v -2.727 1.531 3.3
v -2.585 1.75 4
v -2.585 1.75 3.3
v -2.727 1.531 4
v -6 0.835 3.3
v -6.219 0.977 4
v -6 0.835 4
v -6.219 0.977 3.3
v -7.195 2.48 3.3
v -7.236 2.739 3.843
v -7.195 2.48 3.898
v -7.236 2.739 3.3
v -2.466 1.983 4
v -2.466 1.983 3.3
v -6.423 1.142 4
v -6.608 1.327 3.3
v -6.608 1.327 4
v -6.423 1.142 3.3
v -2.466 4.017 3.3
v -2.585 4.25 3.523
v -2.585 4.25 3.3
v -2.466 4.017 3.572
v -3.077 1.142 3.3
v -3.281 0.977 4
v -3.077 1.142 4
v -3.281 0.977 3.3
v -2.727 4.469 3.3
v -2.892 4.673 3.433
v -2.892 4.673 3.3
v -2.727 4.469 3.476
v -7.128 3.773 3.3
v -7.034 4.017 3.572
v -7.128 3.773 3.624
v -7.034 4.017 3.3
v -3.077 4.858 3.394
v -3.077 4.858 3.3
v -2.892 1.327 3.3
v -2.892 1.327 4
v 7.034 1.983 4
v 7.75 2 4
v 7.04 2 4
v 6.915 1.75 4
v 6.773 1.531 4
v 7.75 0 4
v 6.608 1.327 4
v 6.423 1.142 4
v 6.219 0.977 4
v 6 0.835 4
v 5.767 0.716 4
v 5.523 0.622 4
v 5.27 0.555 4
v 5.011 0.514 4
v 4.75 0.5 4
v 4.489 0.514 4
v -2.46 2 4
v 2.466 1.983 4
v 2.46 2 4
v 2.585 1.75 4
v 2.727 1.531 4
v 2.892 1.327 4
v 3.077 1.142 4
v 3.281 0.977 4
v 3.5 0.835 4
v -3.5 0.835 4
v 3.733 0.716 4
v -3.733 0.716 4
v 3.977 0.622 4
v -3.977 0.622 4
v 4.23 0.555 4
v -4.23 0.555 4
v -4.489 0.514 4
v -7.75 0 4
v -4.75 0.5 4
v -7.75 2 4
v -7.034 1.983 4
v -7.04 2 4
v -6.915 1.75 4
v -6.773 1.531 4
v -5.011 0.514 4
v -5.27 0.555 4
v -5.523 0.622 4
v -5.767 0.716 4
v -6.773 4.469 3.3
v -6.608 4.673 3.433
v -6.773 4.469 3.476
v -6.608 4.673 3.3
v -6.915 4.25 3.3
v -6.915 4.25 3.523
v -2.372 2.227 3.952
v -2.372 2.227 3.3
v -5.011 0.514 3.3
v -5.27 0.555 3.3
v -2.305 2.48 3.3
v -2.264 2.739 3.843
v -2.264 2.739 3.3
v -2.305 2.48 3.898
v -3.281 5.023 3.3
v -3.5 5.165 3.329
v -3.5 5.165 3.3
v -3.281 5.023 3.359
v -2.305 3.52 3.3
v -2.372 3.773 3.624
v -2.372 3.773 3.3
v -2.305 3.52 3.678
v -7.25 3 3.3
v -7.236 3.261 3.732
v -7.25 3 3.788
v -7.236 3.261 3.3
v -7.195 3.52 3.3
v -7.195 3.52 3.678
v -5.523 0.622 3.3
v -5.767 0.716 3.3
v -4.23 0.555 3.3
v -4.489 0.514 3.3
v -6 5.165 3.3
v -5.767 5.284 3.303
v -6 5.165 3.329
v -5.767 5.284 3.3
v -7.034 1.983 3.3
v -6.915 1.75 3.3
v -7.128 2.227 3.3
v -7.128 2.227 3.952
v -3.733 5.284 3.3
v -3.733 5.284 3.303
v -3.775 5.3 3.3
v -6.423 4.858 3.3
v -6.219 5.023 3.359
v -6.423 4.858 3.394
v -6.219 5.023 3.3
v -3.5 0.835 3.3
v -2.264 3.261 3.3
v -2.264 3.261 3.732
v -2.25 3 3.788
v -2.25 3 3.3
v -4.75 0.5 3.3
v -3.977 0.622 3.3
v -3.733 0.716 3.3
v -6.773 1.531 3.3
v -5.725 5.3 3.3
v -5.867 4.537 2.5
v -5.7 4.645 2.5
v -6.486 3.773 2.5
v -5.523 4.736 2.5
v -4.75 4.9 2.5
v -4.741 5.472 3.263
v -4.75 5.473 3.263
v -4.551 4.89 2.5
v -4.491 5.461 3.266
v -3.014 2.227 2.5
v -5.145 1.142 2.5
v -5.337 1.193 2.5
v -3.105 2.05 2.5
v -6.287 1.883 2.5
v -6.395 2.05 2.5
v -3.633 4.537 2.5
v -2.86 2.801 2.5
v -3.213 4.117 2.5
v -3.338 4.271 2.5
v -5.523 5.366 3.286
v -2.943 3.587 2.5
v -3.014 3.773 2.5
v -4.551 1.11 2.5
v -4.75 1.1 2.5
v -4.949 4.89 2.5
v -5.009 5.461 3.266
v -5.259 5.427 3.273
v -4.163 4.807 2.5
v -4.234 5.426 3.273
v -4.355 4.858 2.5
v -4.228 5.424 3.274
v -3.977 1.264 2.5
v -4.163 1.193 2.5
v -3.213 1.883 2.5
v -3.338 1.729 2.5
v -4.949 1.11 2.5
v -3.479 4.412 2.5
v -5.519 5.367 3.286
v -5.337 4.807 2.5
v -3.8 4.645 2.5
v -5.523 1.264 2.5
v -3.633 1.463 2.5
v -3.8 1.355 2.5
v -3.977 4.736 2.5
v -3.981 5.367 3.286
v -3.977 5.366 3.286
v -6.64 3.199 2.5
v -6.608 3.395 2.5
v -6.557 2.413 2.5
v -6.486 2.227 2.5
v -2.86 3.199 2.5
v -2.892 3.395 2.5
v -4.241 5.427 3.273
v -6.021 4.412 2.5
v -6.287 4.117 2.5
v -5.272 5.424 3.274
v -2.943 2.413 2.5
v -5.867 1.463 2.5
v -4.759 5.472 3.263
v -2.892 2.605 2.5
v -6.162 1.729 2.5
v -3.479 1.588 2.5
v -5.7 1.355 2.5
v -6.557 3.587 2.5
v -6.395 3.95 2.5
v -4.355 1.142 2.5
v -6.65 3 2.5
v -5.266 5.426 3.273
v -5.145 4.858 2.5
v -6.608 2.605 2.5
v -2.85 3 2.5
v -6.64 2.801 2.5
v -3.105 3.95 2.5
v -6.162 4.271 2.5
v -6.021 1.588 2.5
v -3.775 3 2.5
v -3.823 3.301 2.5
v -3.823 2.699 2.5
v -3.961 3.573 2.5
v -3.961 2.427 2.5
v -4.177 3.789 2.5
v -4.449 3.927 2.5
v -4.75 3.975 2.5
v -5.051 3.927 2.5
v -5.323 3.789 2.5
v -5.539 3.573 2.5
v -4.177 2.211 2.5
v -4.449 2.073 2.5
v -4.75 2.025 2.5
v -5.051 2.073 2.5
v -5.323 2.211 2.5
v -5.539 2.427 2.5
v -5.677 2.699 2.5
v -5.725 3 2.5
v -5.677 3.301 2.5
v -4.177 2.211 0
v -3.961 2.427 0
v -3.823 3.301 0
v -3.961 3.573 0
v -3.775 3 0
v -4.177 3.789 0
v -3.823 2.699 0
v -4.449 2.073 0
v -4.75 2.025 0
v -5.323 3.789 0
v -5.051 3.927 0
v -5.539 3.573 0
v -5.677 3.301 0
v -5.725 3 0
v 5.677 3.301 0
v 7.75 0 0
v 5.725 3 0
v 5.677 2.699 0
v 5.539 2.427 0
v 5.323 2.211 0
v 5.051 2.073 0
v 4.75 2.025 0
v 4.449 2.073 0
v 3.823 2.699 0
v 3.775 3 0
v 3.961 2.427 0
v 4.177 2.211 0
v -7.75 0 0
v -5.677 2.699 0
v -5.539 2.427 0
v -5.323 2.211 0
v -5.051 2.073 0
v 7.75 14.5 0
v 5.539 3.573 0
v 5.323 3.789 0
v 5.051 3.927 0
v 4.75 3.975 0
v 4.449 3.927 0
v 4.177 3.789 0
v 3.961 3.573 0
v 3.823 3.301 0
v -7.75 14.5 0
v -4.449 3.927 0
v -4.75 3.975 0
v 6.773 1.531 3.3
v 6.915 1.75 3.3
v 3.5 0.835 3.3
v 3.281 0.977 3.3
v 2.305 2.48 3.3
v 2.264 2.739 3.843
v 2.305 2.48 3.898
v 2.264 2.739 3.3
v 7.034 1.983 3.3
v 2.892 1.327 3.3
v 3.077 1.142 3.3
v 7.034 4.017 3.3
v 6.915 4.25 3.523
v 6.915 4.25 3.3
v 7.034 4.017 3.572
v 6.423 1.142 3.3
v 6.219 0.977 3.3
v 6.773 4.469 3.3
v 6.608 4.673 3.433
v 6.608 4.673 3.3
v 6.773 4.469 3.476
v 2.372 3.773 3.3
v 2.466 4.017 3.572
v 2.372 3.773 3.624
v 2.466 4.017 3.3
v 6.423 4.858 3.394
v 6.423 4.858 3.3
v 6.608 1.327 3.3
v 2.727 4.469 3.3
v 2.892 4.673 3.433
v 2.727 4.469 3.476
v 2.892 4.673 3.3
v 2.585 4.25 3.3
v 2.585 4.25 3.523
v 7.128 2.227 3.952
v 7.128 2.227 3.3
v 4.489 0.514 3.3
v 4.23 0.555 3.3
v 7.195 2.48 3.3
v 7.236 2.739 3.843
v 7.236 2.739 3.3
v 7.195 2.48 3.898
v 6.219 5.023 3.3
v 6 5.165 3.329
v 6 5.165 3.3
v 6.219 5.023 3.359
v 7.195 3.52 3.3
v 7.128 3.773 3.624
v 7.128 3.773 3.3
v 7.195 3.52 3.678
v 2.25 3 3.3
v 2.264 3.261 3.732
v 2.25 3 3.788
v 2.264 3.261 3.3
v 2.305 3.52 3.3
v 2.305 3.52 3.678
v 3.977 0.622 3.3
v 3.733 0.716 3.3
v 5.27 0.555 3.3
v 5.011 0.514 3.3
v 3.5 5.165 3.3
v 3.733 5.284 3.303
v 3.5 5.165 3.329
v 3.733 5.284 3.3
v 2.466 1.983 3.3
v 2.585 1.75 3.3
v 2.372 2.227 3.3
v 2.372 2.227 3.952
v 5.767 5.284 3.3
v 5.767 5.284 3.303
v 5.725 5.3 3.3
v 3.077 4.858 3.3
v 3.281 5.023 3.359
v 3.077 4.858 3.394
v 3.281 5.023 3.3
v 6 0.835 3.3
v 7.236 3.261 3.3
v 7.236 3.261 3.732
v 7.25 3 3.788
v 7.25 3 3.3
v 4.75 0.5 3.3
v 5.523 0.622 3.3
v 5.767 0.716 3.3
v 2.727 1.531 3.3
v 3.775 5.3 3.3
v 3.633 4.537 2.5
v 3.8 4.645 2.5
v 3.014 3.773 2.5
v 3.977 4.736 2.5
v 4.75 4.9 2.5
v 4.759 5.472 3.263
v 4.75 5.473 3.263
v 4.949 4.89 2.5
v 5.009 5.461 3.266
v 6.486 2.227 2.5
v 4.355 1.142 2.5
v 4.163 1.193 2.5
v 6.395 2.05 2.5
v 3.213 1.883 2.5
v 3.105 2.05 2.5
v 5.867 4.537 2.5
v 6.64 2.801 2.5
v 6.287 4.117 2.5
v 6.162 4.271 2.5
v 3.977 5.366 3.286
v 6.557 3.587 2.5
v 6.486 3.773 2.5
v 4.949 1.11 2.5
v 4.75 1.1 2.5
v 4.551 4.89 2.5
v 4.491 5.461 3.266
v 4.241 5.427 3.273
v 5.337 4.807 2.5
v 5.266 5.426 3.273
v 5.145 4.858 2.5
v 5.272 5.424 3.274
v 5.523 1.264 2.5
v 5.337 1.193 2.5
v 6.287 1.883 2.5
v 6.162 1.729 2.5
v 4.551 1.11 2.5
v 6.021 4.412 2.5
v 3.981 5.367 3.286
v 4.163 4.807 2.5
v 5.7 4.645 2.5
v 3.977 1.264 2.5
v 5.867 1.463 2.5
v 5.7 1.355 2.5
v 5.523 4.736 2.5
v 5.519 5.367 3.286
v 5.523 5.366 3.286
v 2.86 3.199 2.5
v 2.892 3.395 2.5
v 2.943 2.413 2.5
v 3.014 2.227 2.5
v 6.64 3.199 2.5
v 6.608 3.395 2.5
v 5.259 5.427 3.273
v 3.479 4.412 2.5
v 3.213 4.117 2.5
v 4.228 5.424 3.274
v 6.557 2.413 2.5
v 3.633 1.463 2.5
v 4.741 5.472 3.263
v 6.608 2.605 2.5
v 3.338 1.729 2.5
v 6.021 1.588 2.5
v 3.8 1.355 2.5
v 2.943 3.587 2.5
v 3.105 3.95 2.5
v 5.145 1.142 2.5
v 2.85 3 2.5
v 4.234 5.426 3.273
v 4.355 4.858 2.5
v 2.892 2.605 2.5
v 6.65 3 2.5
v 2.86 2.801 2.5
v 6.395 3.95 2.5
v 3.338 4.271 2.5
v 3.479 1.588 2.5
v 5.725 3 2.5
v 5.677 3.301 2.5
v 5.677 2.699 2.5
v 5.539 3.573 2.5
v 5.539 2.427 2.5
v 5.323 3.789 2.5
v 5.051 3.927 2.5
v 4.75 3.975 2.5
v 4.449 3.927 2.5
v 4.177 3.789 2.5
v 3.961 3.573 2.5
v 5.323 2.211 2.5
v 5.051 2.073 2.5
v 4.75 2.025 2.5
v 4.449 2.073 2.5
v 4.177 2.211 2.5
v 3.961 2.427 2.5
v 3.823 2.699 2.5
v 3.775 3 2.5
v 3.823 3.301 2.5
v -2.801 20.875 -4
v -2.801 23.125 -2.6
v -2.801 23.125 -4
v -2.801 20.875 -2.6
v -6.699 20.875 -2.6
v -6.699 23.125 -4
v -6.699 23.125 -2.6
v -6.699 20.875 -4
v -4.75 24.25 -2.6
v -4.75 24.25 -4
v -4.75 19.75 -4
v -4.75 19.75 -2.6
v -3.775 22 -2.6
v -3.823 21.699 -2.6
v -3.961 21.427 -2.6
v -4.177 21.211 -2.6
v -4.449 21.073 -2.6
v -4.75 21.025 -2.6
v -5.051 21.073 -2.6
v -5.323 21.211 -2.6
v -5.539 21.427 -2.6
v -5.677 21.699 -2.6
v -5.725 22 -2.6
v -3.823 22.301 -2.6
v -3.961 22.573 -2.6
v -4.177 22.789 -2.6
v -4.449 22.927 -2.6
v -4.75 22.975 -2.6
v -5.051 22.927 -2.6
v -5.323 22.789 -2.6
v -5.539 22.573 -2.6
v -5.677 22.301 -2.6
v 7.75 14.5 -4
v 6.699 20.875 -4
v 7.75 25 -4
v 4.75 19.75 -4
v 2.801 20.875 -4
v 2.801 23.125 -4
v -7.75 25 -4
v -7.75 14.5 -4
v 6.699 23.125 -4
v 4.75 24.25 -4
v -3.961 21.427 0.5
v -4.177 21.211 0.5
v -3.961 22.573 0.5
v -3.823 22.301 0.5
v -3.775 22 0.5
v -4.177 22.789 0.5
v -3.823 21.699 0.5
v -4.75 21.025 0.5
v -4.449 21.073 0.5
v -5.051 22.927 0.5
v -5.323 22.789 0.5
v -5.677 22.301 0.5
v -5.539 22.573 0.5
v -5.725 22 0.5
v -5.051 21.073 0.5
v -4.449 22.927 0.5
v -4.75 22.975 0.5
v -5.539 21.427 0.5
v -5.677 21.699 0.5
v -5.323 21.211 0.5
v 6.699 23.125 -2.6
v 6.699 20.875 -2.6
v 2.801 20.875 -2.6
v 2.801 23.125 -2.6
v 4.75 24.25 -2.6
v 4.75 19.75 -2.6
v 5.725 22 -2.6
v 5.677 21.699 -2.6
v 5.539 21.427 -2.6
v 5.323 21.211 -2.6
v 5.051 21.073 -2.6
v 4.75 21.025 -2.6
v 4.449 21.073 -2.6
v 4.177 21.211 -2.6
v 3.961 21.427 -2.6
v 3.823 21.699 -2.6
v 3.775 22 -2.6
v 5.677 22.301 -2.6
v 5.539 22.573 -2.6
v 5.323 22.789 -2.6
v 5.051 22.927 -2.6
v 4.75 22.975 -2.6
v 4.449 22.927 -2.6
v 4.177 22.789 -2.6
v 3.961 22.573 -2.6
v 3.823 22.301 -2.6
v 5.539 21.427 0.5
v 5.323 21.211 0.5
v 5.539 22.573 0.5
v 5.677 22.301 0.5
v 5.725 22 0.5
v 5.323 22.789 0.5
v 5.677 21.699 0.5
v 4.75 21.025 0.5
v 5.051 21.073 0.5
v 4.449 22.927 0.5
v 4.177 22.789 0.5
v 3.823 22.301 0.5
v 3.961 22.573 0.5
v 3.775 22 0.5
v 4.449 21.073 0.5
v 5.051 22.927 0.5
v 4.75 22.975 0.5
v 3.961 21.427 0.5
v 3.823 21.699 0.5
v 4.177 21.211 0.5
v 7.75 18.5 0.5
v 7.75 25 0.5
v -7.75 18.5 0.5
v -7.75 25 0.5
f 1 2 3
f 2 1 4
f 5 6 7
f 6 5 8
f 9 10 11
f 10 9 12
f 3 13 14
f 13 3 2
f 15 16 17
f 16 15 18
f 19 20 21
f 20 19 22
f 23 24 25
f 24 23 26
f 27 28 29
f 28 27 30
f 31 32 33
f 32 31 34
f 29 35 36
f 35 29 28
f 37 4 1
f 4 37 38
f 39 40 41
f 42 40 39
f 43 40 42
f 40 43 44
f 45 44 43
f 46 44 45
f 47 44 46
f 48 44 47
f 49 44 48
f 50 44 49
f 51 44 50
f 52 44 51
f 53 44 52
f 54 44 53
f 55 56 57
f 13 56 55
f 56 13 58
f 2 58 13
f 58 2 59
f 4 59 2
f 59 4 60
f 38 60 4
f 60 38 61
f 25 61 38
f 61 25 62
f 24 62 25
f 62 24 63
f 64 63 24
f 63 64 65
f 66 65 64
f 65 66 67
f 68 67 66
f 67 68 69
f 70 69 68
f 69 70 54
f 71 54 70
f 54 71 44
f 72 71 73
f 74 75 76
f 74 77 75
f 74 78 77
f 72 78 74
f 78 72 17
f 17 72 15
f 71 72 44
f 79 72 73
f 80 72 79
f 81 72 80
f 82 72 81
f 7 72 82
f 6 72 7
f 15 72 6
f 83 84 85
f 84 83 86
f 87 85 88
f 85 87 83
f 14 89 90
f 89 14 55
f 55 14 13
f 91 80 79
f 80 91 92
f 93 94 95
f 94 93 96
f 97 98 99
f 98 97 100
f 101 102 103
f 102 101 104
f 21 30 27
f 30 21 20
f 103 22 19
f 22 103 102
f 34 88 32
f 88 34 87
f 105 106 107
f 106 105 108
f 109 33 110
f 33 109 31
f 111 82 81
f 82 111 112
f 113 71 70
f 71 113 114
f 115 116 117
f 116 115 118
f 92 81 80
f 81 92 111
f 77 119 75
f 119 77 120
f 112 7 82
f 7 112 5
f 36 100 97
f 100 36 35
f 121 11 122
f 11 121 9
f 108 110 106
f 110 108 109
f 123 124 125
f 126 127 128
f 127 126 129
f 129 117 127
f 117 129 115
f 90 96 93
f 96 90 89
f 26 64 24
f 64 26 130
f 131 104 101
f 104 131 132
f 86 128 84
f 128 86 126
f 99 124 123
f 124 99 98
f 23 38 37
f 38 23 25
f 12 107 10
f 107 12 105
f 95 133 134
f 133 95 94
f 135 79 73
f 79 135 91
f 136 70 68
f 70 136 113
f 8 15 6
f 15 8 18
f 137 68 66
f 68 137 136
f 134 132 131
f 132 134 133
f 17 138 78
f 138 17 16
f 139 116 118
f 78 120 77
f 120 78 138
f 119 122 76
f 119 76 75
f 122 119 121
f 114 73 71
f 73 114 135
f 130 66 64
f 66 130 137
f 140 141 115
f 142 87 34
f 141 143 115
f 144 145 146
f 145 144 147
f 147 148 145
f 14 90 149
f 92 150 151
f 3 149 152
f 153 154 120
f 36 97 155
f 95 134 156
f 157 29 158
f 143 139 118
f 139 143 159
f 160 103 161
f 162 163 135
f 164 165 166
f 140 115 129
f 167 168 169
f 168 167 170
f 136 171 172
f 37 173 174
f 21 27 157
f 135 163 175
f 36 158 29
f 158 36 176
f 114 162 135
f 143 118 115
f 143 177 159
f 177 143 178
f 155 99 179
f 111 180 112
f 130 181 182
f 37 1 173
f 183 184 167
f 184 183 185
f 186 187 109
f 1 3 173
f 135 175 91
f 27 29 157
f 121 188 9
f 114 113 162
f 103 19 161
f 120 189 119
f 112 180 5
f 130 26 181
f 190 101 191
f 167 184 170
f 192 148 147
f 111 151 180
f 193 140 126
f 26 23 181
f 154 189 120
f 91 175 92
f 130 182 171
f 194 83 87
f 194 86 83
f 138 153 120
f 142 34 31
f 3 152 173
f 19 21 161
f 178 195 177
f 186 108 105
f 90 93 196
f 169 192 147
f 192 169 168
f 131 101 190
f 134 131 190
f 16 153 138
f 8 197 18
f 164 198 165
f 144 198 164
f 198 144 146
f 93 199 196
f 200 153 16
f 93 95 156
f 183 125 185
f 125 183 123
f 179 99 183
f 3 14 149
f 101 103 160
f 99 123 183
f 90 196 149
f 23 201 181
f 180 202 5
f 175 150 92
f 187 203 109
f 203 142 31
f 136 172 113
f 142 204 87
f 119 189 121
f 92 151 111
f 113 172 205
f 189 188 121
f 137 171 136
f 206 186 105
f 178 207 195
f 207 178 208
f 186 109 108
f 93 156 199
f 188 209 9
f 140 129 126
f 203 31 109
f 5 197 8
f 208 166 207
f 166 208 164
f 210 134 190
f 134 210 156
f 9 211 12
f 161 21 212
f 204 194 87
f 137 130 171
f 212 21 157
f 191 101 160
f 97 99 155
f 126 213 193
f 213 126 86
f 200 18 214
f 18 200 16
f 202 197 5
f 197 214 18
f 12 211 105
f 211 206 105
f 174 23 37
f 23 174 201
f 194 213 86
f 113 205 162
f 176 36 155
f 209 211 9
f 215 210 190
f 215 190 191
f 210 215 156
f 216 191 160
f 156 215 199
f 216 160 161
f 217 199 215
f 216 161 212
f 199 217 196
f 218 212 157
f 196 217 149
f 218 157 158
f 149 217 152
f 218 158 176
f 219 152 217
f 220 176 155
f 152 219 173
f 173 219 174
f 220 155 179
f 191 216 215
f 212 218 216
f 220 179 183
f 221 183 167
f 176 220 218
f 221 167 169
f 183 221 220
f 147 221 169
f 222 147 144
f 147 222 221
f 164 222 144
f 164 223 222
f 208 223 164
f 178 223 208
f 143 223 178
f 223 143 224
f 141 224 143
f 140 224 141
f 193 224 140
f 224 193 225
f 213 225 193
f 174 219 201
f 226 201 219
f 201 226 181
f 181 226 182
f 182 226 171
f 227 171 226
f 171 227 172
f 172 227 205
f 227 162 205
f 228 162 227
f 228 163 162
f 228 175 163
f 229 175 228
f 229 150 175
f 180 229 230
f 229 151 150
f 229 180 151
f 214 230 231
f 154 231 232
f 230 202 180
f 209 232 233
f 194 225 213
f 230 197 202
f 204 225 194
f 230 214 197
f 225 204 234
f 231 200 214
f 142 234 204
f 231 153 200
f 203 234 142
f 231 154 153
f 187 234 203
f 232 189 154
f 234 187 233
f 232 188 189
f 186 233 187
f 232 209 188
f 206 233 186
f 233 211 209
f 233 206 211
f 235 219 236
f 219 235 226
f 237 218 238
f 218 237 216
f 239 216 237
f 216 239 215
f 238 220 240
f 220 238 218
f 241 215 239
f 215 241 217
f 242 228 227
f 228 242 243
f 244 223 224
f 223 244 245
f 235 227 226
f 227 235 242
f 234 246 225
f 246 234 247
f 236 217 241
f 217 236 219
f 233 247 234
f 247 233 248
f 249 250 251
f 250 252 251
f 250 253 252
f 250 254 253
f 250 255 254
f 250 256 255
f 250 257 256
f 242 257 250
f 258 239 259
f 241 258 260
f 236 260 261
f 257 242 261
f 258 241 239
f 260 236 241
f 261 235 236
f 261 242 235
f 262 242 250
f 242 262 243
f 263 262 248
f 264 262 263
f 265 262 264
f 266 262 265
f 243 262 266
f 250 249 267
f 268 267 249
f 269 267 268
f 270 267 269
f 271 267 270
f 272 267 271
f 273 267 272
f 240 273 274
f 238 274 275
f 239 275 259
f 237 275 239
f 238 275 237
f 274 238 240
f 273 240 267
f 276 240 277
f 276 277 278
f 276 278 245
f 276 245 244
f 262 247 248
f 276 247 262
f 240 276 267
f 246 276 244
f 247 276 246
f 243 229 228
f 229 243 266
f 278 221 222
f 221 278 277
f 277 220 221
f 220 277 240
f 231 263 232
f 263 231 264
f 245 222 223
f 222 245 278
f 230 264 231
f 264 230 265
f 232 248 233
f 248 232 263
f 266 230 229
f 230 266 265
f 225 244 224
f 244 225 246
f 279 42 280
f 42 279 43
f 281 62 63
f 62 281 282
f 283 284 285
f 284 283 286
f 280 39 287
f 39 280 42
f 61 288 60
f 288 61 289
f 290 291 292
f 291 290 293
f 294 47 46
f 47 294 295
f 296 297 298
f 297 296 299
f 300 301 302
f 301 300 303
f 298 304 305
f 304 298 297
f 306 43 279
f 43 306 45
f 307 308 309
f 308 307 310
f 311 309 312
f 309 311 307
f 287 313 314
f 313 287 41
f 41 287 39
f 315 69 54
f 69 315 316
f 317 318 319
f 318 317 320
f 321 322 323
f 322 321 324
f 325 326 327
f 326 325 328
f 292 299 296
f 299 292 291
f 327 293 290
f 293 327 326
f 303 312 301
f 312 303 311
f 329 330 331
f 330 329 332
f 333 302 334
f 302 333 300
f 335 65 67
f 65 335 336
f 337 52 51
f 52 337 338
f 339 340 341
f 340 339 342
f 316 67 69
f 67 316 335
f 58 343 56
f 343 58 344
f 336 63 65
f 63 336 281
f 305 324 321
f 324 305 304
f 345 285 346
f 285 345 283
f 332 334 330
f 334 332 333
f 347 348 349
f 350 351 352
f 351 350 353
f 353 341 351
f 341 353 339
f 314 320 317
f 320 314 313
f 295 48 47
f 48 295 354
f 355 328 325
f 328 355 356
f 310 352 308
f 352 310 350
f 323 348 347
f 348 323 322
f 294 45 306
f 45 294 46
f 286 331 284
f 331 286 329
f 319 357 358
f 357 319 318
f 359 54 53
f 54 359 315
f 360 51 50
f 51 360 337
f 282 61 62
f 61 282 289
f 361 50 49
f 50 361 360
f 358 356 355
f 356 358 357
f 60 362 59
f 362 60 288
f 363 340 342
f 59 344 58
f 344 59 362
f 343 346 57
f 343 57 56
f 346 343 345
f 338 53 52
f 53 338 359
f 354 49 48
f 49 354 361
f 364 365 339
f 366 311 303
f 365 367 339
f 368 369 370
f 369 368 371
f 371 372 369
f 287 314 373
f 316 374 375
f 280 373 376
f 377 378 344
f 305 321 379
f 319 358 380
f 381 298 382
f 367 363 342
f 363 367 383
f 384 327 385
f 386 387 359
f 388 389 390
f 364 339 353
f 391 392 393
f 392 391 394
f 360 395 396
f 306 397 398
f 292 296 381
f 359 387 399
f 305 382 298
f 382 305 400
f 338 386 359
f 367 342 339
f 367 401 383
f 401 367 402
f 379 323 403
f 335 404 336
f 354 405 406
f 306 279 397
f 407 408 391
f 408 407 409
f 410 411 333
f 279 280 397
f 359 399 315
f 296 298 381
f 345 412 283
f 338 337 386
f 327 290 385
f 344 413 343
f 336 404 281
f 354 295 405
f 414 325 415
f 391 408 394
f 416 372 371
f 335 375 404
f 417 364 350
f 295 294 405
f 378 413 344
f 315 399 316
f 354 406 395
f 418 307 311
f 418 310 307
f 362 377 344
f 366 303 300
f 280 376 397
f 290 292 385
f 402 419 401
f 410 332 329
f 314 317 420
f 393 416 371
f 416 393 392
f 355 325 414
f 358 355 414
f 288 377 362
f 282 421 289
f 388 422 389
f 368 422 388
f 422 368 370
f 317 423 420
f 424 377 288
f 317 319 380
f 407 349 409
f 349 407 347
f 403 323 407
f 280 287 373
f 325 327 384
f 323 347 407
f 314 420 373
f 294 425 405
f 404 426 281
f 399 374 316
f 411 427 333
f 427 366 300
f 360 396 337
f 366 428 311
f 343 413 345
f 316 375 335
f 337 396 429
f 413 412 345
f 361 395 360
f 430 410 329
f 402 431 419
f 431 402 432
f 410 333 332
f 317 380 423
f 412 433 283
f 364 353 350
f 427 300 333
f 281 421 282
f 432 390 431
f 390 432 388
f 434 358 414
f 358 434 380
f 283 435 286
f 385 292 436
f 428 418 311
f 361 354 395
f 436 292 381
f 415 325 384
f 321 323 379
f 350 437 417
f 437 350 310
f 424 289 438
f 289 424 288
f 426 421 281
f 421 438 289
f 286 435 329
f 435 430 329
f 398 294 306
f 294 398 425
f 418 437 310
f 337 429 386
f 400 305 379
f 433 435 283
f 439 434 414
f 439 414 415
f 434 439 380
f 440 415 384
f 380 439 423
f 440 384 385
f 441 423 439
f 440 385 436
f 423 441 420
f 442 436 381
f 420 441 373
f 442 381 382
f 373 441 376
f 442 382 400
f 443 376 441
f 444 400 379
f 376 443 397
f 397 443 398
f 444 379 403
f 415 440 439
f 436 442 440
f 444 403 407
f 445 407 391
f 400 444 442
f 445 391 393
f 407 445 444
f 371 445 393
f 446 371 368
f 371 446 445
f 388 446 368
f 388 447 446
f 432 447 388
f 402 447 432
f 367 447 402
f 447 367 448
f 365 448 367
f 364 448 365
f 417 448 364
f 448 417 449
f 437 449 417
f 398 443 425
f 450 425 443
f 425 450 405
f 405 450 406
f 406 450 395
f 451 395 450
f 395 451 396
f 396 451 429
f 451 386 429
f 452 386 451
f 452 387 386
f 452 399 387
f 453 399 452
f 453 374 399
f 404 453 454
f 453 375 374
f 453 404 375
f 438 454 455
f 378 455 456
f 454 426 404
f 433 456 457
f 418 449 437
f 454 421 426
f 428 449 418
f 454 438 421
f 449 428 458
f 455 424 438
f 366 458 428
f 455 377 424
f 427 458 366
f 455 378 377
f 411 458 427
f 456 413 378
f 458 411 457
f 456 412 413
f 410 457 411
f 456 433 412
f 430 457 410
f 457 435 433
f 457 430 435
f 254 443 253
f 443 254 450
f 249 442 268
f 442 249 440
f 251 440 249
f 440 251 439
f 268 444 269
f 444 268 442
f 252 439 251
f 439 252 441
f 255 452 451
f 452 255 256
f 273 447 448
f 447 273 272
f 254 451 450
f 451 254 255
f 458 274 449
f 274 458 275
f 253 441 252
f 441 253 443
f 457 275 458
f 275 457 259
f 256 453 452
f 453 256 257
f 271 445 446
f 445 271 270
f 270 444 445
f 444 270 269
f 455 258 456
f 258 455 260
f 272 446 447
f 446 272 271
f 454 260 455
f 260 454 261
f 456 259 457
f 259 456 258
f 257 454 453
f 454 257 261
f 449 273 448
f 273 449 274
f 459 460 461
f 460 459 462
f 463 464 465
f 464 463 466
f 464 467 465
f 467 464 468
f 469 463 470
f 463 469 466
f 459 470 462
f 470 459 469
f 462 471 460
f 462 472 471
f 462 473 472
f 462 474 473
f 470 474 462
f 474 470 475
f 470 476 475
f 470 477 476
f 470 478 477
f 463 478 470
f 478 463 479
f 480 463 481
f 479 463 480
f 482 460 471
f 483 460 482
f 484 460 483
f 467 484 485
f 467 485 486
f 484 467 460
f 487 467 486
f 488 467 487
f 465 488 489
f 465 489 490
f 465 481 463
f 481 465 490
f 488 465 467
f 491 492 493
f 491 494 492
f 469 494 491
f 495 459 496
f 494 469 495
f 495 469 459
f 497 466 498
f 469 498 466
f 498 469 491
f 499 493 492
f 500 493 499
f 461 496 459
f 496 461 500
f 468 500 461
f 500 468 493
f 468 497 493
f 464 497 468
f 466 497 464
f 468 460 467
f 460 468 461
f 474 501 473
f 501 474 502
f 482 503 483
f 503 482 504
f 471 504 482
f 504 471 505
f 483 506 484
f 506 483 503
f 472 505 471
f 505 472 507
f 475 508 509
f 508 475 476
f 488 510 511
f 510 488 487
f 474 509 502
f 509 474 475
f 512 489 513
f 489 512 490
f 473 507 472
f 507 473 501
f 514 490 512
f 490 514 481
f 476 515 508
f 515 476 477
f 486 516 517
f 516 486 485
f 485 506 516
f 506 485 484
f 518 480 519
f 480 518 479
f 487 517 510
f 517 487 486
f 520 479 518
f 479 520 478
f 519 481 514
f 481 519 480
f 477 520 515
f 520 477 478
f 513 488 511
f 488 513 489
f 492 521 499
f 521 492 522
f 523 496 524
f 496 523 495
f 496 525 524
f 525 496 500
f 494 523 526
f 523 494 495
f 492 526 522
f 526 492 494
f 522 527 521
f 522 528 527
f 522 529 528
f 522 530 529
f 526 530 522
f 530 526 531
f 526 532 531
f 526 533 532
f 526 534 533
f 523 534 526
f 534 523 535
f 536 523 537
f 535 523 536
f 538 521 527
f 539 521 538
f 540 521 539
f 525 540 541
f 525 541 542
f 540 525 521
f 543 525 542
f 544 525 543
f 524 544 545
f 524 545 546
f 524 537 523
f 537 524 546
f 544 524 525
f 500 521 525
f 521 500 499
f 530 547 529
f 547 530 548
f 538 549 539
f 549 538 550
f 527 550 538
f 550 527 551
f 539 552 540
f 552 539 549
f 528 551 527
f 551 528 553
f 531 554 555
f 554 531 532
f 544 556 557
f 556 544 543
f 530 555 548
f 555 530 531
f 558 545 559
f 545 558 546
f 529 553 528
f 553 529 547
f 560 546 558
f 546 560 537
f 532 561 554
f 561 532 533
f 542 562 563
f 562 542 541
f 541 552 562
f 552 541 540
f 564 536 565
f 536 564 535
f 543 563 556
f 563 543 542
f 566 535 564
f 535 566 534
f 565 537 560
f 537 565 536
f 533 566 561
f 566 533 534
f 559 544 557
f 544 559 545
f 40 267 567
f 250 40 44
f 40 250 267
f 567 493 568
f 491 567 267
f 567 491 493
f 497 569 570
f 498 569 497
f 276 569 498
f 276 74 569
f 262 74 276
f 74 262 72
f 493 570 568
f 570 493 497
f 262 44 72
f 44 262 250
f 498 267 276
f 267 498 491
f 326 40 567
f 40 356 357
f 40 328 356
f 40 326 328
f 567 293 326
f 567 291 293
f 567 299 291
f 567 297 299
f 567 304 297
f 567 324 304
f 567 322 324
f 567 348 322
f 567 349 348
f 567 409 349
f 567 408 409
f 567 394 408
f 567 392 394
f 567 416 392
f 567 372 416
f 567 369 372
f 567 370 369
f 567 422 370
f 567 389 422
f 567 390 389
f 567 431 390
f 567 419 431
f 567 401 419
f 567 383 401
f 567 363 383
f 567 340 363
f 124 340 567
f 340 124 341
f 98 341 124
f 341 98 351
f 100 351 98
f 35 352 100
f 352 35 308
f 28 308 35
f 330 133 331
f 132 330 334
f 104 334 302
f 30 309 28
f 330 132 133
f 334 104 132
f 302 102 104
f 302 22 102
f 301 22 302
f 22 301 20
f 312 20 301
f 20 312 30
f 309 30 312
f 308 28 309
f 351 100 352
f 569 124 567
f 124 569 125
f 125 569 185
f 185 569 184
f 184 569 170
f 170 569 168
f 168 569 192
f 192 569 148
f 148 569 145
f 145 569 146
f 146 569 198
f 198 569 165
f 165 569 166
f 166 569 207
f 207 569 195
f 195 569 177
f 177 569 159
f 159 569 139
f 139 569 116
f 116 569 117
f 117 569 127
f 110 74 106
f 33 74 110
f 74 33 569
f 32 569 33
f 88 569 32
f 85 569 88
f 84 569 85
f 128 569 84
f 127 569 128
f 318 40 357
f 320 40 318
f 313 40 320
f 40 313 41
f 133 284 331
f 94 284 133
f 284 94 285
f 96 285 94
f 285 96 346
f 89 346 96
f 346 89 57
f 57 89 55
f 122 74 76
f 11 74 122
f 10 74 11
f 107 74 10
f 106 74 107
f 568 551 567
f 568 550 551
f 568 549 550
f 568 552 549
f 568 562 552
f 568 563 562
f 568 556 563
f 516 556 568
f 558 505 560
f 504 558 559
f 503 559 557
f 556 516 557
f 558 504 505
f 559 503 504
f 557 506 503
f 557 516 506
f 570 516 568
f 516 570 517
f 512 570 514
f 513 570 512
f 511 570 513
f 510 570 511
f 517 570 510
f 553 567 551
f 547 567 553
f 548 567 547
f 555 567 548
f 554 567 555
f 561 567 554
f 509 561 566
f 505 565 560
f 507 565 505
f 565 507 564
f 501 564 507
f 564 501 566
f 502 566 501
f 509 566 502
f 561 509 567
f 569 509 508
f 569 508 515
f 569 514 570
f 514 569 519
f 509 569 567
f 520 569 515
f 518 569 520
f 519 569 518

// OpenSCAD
/* Copyright 2021 Alex Volkov <alex@flamy.ca>
 * GNU GPL v3
 */
 
// Using measurements from x-end mototr with the following license
// PRUSA iteration4
// X end motor
// GNU GPL v3
// Josef Průša <iam@josefprusa.cz> and contributors
// http://www.reprap.org/wiki/Prusa_Mendel
// http://prusamendel.org

include <../libs/hardware-recess.scad>;

endstop_offset=25;
extra_width = 6;

module endstop_mount(){
    translate([-4.75,0,0])hole_w_end(4, 1.4, "round", M2);
    // Front screw hole for endstop
    translate([4.75,0,0])hole_w_end(4, 1.4, "round", M2);
}

module endstop_nut(hole_len){
    translate([-4.75,0,-2])hole_w_end(hole_len, 1.4, "hex", M2, flip=true);
    // Front screw hole for endstop
    translate([4.75,0,-2])hole_w_end(hole_len, 1.4, "hex", M2, flip=true);
}


difference(){
    translate([-4.75 - extra_width/2, 0, -4]) 
        cube([4.75*2 + extra_width , endstop_offset, 8]);
    translate([-4.75 - extra_width/2 , 0, -5]) 
            cube([4.75*2 + extra_width , endstop_offset/2 + 2, 5]);
    
    hull(){
        translate([-4.75 - extra_width/2, endstop_offset /2 + 6, 0.5]) 
            cube([4.75*2 + extra_width , endstop_offset, 2]);
        translate([-4.75 - extra_width/2, 2, 4]) 
            cube([4.75*2 + extra_width , endstop_offset, 0.5]);
    }
    
    translate([0, 3, 0])
        endstop_mount();
    translate([0, endstop_offset - 3, -2])
        endstop_nut(5);
}
